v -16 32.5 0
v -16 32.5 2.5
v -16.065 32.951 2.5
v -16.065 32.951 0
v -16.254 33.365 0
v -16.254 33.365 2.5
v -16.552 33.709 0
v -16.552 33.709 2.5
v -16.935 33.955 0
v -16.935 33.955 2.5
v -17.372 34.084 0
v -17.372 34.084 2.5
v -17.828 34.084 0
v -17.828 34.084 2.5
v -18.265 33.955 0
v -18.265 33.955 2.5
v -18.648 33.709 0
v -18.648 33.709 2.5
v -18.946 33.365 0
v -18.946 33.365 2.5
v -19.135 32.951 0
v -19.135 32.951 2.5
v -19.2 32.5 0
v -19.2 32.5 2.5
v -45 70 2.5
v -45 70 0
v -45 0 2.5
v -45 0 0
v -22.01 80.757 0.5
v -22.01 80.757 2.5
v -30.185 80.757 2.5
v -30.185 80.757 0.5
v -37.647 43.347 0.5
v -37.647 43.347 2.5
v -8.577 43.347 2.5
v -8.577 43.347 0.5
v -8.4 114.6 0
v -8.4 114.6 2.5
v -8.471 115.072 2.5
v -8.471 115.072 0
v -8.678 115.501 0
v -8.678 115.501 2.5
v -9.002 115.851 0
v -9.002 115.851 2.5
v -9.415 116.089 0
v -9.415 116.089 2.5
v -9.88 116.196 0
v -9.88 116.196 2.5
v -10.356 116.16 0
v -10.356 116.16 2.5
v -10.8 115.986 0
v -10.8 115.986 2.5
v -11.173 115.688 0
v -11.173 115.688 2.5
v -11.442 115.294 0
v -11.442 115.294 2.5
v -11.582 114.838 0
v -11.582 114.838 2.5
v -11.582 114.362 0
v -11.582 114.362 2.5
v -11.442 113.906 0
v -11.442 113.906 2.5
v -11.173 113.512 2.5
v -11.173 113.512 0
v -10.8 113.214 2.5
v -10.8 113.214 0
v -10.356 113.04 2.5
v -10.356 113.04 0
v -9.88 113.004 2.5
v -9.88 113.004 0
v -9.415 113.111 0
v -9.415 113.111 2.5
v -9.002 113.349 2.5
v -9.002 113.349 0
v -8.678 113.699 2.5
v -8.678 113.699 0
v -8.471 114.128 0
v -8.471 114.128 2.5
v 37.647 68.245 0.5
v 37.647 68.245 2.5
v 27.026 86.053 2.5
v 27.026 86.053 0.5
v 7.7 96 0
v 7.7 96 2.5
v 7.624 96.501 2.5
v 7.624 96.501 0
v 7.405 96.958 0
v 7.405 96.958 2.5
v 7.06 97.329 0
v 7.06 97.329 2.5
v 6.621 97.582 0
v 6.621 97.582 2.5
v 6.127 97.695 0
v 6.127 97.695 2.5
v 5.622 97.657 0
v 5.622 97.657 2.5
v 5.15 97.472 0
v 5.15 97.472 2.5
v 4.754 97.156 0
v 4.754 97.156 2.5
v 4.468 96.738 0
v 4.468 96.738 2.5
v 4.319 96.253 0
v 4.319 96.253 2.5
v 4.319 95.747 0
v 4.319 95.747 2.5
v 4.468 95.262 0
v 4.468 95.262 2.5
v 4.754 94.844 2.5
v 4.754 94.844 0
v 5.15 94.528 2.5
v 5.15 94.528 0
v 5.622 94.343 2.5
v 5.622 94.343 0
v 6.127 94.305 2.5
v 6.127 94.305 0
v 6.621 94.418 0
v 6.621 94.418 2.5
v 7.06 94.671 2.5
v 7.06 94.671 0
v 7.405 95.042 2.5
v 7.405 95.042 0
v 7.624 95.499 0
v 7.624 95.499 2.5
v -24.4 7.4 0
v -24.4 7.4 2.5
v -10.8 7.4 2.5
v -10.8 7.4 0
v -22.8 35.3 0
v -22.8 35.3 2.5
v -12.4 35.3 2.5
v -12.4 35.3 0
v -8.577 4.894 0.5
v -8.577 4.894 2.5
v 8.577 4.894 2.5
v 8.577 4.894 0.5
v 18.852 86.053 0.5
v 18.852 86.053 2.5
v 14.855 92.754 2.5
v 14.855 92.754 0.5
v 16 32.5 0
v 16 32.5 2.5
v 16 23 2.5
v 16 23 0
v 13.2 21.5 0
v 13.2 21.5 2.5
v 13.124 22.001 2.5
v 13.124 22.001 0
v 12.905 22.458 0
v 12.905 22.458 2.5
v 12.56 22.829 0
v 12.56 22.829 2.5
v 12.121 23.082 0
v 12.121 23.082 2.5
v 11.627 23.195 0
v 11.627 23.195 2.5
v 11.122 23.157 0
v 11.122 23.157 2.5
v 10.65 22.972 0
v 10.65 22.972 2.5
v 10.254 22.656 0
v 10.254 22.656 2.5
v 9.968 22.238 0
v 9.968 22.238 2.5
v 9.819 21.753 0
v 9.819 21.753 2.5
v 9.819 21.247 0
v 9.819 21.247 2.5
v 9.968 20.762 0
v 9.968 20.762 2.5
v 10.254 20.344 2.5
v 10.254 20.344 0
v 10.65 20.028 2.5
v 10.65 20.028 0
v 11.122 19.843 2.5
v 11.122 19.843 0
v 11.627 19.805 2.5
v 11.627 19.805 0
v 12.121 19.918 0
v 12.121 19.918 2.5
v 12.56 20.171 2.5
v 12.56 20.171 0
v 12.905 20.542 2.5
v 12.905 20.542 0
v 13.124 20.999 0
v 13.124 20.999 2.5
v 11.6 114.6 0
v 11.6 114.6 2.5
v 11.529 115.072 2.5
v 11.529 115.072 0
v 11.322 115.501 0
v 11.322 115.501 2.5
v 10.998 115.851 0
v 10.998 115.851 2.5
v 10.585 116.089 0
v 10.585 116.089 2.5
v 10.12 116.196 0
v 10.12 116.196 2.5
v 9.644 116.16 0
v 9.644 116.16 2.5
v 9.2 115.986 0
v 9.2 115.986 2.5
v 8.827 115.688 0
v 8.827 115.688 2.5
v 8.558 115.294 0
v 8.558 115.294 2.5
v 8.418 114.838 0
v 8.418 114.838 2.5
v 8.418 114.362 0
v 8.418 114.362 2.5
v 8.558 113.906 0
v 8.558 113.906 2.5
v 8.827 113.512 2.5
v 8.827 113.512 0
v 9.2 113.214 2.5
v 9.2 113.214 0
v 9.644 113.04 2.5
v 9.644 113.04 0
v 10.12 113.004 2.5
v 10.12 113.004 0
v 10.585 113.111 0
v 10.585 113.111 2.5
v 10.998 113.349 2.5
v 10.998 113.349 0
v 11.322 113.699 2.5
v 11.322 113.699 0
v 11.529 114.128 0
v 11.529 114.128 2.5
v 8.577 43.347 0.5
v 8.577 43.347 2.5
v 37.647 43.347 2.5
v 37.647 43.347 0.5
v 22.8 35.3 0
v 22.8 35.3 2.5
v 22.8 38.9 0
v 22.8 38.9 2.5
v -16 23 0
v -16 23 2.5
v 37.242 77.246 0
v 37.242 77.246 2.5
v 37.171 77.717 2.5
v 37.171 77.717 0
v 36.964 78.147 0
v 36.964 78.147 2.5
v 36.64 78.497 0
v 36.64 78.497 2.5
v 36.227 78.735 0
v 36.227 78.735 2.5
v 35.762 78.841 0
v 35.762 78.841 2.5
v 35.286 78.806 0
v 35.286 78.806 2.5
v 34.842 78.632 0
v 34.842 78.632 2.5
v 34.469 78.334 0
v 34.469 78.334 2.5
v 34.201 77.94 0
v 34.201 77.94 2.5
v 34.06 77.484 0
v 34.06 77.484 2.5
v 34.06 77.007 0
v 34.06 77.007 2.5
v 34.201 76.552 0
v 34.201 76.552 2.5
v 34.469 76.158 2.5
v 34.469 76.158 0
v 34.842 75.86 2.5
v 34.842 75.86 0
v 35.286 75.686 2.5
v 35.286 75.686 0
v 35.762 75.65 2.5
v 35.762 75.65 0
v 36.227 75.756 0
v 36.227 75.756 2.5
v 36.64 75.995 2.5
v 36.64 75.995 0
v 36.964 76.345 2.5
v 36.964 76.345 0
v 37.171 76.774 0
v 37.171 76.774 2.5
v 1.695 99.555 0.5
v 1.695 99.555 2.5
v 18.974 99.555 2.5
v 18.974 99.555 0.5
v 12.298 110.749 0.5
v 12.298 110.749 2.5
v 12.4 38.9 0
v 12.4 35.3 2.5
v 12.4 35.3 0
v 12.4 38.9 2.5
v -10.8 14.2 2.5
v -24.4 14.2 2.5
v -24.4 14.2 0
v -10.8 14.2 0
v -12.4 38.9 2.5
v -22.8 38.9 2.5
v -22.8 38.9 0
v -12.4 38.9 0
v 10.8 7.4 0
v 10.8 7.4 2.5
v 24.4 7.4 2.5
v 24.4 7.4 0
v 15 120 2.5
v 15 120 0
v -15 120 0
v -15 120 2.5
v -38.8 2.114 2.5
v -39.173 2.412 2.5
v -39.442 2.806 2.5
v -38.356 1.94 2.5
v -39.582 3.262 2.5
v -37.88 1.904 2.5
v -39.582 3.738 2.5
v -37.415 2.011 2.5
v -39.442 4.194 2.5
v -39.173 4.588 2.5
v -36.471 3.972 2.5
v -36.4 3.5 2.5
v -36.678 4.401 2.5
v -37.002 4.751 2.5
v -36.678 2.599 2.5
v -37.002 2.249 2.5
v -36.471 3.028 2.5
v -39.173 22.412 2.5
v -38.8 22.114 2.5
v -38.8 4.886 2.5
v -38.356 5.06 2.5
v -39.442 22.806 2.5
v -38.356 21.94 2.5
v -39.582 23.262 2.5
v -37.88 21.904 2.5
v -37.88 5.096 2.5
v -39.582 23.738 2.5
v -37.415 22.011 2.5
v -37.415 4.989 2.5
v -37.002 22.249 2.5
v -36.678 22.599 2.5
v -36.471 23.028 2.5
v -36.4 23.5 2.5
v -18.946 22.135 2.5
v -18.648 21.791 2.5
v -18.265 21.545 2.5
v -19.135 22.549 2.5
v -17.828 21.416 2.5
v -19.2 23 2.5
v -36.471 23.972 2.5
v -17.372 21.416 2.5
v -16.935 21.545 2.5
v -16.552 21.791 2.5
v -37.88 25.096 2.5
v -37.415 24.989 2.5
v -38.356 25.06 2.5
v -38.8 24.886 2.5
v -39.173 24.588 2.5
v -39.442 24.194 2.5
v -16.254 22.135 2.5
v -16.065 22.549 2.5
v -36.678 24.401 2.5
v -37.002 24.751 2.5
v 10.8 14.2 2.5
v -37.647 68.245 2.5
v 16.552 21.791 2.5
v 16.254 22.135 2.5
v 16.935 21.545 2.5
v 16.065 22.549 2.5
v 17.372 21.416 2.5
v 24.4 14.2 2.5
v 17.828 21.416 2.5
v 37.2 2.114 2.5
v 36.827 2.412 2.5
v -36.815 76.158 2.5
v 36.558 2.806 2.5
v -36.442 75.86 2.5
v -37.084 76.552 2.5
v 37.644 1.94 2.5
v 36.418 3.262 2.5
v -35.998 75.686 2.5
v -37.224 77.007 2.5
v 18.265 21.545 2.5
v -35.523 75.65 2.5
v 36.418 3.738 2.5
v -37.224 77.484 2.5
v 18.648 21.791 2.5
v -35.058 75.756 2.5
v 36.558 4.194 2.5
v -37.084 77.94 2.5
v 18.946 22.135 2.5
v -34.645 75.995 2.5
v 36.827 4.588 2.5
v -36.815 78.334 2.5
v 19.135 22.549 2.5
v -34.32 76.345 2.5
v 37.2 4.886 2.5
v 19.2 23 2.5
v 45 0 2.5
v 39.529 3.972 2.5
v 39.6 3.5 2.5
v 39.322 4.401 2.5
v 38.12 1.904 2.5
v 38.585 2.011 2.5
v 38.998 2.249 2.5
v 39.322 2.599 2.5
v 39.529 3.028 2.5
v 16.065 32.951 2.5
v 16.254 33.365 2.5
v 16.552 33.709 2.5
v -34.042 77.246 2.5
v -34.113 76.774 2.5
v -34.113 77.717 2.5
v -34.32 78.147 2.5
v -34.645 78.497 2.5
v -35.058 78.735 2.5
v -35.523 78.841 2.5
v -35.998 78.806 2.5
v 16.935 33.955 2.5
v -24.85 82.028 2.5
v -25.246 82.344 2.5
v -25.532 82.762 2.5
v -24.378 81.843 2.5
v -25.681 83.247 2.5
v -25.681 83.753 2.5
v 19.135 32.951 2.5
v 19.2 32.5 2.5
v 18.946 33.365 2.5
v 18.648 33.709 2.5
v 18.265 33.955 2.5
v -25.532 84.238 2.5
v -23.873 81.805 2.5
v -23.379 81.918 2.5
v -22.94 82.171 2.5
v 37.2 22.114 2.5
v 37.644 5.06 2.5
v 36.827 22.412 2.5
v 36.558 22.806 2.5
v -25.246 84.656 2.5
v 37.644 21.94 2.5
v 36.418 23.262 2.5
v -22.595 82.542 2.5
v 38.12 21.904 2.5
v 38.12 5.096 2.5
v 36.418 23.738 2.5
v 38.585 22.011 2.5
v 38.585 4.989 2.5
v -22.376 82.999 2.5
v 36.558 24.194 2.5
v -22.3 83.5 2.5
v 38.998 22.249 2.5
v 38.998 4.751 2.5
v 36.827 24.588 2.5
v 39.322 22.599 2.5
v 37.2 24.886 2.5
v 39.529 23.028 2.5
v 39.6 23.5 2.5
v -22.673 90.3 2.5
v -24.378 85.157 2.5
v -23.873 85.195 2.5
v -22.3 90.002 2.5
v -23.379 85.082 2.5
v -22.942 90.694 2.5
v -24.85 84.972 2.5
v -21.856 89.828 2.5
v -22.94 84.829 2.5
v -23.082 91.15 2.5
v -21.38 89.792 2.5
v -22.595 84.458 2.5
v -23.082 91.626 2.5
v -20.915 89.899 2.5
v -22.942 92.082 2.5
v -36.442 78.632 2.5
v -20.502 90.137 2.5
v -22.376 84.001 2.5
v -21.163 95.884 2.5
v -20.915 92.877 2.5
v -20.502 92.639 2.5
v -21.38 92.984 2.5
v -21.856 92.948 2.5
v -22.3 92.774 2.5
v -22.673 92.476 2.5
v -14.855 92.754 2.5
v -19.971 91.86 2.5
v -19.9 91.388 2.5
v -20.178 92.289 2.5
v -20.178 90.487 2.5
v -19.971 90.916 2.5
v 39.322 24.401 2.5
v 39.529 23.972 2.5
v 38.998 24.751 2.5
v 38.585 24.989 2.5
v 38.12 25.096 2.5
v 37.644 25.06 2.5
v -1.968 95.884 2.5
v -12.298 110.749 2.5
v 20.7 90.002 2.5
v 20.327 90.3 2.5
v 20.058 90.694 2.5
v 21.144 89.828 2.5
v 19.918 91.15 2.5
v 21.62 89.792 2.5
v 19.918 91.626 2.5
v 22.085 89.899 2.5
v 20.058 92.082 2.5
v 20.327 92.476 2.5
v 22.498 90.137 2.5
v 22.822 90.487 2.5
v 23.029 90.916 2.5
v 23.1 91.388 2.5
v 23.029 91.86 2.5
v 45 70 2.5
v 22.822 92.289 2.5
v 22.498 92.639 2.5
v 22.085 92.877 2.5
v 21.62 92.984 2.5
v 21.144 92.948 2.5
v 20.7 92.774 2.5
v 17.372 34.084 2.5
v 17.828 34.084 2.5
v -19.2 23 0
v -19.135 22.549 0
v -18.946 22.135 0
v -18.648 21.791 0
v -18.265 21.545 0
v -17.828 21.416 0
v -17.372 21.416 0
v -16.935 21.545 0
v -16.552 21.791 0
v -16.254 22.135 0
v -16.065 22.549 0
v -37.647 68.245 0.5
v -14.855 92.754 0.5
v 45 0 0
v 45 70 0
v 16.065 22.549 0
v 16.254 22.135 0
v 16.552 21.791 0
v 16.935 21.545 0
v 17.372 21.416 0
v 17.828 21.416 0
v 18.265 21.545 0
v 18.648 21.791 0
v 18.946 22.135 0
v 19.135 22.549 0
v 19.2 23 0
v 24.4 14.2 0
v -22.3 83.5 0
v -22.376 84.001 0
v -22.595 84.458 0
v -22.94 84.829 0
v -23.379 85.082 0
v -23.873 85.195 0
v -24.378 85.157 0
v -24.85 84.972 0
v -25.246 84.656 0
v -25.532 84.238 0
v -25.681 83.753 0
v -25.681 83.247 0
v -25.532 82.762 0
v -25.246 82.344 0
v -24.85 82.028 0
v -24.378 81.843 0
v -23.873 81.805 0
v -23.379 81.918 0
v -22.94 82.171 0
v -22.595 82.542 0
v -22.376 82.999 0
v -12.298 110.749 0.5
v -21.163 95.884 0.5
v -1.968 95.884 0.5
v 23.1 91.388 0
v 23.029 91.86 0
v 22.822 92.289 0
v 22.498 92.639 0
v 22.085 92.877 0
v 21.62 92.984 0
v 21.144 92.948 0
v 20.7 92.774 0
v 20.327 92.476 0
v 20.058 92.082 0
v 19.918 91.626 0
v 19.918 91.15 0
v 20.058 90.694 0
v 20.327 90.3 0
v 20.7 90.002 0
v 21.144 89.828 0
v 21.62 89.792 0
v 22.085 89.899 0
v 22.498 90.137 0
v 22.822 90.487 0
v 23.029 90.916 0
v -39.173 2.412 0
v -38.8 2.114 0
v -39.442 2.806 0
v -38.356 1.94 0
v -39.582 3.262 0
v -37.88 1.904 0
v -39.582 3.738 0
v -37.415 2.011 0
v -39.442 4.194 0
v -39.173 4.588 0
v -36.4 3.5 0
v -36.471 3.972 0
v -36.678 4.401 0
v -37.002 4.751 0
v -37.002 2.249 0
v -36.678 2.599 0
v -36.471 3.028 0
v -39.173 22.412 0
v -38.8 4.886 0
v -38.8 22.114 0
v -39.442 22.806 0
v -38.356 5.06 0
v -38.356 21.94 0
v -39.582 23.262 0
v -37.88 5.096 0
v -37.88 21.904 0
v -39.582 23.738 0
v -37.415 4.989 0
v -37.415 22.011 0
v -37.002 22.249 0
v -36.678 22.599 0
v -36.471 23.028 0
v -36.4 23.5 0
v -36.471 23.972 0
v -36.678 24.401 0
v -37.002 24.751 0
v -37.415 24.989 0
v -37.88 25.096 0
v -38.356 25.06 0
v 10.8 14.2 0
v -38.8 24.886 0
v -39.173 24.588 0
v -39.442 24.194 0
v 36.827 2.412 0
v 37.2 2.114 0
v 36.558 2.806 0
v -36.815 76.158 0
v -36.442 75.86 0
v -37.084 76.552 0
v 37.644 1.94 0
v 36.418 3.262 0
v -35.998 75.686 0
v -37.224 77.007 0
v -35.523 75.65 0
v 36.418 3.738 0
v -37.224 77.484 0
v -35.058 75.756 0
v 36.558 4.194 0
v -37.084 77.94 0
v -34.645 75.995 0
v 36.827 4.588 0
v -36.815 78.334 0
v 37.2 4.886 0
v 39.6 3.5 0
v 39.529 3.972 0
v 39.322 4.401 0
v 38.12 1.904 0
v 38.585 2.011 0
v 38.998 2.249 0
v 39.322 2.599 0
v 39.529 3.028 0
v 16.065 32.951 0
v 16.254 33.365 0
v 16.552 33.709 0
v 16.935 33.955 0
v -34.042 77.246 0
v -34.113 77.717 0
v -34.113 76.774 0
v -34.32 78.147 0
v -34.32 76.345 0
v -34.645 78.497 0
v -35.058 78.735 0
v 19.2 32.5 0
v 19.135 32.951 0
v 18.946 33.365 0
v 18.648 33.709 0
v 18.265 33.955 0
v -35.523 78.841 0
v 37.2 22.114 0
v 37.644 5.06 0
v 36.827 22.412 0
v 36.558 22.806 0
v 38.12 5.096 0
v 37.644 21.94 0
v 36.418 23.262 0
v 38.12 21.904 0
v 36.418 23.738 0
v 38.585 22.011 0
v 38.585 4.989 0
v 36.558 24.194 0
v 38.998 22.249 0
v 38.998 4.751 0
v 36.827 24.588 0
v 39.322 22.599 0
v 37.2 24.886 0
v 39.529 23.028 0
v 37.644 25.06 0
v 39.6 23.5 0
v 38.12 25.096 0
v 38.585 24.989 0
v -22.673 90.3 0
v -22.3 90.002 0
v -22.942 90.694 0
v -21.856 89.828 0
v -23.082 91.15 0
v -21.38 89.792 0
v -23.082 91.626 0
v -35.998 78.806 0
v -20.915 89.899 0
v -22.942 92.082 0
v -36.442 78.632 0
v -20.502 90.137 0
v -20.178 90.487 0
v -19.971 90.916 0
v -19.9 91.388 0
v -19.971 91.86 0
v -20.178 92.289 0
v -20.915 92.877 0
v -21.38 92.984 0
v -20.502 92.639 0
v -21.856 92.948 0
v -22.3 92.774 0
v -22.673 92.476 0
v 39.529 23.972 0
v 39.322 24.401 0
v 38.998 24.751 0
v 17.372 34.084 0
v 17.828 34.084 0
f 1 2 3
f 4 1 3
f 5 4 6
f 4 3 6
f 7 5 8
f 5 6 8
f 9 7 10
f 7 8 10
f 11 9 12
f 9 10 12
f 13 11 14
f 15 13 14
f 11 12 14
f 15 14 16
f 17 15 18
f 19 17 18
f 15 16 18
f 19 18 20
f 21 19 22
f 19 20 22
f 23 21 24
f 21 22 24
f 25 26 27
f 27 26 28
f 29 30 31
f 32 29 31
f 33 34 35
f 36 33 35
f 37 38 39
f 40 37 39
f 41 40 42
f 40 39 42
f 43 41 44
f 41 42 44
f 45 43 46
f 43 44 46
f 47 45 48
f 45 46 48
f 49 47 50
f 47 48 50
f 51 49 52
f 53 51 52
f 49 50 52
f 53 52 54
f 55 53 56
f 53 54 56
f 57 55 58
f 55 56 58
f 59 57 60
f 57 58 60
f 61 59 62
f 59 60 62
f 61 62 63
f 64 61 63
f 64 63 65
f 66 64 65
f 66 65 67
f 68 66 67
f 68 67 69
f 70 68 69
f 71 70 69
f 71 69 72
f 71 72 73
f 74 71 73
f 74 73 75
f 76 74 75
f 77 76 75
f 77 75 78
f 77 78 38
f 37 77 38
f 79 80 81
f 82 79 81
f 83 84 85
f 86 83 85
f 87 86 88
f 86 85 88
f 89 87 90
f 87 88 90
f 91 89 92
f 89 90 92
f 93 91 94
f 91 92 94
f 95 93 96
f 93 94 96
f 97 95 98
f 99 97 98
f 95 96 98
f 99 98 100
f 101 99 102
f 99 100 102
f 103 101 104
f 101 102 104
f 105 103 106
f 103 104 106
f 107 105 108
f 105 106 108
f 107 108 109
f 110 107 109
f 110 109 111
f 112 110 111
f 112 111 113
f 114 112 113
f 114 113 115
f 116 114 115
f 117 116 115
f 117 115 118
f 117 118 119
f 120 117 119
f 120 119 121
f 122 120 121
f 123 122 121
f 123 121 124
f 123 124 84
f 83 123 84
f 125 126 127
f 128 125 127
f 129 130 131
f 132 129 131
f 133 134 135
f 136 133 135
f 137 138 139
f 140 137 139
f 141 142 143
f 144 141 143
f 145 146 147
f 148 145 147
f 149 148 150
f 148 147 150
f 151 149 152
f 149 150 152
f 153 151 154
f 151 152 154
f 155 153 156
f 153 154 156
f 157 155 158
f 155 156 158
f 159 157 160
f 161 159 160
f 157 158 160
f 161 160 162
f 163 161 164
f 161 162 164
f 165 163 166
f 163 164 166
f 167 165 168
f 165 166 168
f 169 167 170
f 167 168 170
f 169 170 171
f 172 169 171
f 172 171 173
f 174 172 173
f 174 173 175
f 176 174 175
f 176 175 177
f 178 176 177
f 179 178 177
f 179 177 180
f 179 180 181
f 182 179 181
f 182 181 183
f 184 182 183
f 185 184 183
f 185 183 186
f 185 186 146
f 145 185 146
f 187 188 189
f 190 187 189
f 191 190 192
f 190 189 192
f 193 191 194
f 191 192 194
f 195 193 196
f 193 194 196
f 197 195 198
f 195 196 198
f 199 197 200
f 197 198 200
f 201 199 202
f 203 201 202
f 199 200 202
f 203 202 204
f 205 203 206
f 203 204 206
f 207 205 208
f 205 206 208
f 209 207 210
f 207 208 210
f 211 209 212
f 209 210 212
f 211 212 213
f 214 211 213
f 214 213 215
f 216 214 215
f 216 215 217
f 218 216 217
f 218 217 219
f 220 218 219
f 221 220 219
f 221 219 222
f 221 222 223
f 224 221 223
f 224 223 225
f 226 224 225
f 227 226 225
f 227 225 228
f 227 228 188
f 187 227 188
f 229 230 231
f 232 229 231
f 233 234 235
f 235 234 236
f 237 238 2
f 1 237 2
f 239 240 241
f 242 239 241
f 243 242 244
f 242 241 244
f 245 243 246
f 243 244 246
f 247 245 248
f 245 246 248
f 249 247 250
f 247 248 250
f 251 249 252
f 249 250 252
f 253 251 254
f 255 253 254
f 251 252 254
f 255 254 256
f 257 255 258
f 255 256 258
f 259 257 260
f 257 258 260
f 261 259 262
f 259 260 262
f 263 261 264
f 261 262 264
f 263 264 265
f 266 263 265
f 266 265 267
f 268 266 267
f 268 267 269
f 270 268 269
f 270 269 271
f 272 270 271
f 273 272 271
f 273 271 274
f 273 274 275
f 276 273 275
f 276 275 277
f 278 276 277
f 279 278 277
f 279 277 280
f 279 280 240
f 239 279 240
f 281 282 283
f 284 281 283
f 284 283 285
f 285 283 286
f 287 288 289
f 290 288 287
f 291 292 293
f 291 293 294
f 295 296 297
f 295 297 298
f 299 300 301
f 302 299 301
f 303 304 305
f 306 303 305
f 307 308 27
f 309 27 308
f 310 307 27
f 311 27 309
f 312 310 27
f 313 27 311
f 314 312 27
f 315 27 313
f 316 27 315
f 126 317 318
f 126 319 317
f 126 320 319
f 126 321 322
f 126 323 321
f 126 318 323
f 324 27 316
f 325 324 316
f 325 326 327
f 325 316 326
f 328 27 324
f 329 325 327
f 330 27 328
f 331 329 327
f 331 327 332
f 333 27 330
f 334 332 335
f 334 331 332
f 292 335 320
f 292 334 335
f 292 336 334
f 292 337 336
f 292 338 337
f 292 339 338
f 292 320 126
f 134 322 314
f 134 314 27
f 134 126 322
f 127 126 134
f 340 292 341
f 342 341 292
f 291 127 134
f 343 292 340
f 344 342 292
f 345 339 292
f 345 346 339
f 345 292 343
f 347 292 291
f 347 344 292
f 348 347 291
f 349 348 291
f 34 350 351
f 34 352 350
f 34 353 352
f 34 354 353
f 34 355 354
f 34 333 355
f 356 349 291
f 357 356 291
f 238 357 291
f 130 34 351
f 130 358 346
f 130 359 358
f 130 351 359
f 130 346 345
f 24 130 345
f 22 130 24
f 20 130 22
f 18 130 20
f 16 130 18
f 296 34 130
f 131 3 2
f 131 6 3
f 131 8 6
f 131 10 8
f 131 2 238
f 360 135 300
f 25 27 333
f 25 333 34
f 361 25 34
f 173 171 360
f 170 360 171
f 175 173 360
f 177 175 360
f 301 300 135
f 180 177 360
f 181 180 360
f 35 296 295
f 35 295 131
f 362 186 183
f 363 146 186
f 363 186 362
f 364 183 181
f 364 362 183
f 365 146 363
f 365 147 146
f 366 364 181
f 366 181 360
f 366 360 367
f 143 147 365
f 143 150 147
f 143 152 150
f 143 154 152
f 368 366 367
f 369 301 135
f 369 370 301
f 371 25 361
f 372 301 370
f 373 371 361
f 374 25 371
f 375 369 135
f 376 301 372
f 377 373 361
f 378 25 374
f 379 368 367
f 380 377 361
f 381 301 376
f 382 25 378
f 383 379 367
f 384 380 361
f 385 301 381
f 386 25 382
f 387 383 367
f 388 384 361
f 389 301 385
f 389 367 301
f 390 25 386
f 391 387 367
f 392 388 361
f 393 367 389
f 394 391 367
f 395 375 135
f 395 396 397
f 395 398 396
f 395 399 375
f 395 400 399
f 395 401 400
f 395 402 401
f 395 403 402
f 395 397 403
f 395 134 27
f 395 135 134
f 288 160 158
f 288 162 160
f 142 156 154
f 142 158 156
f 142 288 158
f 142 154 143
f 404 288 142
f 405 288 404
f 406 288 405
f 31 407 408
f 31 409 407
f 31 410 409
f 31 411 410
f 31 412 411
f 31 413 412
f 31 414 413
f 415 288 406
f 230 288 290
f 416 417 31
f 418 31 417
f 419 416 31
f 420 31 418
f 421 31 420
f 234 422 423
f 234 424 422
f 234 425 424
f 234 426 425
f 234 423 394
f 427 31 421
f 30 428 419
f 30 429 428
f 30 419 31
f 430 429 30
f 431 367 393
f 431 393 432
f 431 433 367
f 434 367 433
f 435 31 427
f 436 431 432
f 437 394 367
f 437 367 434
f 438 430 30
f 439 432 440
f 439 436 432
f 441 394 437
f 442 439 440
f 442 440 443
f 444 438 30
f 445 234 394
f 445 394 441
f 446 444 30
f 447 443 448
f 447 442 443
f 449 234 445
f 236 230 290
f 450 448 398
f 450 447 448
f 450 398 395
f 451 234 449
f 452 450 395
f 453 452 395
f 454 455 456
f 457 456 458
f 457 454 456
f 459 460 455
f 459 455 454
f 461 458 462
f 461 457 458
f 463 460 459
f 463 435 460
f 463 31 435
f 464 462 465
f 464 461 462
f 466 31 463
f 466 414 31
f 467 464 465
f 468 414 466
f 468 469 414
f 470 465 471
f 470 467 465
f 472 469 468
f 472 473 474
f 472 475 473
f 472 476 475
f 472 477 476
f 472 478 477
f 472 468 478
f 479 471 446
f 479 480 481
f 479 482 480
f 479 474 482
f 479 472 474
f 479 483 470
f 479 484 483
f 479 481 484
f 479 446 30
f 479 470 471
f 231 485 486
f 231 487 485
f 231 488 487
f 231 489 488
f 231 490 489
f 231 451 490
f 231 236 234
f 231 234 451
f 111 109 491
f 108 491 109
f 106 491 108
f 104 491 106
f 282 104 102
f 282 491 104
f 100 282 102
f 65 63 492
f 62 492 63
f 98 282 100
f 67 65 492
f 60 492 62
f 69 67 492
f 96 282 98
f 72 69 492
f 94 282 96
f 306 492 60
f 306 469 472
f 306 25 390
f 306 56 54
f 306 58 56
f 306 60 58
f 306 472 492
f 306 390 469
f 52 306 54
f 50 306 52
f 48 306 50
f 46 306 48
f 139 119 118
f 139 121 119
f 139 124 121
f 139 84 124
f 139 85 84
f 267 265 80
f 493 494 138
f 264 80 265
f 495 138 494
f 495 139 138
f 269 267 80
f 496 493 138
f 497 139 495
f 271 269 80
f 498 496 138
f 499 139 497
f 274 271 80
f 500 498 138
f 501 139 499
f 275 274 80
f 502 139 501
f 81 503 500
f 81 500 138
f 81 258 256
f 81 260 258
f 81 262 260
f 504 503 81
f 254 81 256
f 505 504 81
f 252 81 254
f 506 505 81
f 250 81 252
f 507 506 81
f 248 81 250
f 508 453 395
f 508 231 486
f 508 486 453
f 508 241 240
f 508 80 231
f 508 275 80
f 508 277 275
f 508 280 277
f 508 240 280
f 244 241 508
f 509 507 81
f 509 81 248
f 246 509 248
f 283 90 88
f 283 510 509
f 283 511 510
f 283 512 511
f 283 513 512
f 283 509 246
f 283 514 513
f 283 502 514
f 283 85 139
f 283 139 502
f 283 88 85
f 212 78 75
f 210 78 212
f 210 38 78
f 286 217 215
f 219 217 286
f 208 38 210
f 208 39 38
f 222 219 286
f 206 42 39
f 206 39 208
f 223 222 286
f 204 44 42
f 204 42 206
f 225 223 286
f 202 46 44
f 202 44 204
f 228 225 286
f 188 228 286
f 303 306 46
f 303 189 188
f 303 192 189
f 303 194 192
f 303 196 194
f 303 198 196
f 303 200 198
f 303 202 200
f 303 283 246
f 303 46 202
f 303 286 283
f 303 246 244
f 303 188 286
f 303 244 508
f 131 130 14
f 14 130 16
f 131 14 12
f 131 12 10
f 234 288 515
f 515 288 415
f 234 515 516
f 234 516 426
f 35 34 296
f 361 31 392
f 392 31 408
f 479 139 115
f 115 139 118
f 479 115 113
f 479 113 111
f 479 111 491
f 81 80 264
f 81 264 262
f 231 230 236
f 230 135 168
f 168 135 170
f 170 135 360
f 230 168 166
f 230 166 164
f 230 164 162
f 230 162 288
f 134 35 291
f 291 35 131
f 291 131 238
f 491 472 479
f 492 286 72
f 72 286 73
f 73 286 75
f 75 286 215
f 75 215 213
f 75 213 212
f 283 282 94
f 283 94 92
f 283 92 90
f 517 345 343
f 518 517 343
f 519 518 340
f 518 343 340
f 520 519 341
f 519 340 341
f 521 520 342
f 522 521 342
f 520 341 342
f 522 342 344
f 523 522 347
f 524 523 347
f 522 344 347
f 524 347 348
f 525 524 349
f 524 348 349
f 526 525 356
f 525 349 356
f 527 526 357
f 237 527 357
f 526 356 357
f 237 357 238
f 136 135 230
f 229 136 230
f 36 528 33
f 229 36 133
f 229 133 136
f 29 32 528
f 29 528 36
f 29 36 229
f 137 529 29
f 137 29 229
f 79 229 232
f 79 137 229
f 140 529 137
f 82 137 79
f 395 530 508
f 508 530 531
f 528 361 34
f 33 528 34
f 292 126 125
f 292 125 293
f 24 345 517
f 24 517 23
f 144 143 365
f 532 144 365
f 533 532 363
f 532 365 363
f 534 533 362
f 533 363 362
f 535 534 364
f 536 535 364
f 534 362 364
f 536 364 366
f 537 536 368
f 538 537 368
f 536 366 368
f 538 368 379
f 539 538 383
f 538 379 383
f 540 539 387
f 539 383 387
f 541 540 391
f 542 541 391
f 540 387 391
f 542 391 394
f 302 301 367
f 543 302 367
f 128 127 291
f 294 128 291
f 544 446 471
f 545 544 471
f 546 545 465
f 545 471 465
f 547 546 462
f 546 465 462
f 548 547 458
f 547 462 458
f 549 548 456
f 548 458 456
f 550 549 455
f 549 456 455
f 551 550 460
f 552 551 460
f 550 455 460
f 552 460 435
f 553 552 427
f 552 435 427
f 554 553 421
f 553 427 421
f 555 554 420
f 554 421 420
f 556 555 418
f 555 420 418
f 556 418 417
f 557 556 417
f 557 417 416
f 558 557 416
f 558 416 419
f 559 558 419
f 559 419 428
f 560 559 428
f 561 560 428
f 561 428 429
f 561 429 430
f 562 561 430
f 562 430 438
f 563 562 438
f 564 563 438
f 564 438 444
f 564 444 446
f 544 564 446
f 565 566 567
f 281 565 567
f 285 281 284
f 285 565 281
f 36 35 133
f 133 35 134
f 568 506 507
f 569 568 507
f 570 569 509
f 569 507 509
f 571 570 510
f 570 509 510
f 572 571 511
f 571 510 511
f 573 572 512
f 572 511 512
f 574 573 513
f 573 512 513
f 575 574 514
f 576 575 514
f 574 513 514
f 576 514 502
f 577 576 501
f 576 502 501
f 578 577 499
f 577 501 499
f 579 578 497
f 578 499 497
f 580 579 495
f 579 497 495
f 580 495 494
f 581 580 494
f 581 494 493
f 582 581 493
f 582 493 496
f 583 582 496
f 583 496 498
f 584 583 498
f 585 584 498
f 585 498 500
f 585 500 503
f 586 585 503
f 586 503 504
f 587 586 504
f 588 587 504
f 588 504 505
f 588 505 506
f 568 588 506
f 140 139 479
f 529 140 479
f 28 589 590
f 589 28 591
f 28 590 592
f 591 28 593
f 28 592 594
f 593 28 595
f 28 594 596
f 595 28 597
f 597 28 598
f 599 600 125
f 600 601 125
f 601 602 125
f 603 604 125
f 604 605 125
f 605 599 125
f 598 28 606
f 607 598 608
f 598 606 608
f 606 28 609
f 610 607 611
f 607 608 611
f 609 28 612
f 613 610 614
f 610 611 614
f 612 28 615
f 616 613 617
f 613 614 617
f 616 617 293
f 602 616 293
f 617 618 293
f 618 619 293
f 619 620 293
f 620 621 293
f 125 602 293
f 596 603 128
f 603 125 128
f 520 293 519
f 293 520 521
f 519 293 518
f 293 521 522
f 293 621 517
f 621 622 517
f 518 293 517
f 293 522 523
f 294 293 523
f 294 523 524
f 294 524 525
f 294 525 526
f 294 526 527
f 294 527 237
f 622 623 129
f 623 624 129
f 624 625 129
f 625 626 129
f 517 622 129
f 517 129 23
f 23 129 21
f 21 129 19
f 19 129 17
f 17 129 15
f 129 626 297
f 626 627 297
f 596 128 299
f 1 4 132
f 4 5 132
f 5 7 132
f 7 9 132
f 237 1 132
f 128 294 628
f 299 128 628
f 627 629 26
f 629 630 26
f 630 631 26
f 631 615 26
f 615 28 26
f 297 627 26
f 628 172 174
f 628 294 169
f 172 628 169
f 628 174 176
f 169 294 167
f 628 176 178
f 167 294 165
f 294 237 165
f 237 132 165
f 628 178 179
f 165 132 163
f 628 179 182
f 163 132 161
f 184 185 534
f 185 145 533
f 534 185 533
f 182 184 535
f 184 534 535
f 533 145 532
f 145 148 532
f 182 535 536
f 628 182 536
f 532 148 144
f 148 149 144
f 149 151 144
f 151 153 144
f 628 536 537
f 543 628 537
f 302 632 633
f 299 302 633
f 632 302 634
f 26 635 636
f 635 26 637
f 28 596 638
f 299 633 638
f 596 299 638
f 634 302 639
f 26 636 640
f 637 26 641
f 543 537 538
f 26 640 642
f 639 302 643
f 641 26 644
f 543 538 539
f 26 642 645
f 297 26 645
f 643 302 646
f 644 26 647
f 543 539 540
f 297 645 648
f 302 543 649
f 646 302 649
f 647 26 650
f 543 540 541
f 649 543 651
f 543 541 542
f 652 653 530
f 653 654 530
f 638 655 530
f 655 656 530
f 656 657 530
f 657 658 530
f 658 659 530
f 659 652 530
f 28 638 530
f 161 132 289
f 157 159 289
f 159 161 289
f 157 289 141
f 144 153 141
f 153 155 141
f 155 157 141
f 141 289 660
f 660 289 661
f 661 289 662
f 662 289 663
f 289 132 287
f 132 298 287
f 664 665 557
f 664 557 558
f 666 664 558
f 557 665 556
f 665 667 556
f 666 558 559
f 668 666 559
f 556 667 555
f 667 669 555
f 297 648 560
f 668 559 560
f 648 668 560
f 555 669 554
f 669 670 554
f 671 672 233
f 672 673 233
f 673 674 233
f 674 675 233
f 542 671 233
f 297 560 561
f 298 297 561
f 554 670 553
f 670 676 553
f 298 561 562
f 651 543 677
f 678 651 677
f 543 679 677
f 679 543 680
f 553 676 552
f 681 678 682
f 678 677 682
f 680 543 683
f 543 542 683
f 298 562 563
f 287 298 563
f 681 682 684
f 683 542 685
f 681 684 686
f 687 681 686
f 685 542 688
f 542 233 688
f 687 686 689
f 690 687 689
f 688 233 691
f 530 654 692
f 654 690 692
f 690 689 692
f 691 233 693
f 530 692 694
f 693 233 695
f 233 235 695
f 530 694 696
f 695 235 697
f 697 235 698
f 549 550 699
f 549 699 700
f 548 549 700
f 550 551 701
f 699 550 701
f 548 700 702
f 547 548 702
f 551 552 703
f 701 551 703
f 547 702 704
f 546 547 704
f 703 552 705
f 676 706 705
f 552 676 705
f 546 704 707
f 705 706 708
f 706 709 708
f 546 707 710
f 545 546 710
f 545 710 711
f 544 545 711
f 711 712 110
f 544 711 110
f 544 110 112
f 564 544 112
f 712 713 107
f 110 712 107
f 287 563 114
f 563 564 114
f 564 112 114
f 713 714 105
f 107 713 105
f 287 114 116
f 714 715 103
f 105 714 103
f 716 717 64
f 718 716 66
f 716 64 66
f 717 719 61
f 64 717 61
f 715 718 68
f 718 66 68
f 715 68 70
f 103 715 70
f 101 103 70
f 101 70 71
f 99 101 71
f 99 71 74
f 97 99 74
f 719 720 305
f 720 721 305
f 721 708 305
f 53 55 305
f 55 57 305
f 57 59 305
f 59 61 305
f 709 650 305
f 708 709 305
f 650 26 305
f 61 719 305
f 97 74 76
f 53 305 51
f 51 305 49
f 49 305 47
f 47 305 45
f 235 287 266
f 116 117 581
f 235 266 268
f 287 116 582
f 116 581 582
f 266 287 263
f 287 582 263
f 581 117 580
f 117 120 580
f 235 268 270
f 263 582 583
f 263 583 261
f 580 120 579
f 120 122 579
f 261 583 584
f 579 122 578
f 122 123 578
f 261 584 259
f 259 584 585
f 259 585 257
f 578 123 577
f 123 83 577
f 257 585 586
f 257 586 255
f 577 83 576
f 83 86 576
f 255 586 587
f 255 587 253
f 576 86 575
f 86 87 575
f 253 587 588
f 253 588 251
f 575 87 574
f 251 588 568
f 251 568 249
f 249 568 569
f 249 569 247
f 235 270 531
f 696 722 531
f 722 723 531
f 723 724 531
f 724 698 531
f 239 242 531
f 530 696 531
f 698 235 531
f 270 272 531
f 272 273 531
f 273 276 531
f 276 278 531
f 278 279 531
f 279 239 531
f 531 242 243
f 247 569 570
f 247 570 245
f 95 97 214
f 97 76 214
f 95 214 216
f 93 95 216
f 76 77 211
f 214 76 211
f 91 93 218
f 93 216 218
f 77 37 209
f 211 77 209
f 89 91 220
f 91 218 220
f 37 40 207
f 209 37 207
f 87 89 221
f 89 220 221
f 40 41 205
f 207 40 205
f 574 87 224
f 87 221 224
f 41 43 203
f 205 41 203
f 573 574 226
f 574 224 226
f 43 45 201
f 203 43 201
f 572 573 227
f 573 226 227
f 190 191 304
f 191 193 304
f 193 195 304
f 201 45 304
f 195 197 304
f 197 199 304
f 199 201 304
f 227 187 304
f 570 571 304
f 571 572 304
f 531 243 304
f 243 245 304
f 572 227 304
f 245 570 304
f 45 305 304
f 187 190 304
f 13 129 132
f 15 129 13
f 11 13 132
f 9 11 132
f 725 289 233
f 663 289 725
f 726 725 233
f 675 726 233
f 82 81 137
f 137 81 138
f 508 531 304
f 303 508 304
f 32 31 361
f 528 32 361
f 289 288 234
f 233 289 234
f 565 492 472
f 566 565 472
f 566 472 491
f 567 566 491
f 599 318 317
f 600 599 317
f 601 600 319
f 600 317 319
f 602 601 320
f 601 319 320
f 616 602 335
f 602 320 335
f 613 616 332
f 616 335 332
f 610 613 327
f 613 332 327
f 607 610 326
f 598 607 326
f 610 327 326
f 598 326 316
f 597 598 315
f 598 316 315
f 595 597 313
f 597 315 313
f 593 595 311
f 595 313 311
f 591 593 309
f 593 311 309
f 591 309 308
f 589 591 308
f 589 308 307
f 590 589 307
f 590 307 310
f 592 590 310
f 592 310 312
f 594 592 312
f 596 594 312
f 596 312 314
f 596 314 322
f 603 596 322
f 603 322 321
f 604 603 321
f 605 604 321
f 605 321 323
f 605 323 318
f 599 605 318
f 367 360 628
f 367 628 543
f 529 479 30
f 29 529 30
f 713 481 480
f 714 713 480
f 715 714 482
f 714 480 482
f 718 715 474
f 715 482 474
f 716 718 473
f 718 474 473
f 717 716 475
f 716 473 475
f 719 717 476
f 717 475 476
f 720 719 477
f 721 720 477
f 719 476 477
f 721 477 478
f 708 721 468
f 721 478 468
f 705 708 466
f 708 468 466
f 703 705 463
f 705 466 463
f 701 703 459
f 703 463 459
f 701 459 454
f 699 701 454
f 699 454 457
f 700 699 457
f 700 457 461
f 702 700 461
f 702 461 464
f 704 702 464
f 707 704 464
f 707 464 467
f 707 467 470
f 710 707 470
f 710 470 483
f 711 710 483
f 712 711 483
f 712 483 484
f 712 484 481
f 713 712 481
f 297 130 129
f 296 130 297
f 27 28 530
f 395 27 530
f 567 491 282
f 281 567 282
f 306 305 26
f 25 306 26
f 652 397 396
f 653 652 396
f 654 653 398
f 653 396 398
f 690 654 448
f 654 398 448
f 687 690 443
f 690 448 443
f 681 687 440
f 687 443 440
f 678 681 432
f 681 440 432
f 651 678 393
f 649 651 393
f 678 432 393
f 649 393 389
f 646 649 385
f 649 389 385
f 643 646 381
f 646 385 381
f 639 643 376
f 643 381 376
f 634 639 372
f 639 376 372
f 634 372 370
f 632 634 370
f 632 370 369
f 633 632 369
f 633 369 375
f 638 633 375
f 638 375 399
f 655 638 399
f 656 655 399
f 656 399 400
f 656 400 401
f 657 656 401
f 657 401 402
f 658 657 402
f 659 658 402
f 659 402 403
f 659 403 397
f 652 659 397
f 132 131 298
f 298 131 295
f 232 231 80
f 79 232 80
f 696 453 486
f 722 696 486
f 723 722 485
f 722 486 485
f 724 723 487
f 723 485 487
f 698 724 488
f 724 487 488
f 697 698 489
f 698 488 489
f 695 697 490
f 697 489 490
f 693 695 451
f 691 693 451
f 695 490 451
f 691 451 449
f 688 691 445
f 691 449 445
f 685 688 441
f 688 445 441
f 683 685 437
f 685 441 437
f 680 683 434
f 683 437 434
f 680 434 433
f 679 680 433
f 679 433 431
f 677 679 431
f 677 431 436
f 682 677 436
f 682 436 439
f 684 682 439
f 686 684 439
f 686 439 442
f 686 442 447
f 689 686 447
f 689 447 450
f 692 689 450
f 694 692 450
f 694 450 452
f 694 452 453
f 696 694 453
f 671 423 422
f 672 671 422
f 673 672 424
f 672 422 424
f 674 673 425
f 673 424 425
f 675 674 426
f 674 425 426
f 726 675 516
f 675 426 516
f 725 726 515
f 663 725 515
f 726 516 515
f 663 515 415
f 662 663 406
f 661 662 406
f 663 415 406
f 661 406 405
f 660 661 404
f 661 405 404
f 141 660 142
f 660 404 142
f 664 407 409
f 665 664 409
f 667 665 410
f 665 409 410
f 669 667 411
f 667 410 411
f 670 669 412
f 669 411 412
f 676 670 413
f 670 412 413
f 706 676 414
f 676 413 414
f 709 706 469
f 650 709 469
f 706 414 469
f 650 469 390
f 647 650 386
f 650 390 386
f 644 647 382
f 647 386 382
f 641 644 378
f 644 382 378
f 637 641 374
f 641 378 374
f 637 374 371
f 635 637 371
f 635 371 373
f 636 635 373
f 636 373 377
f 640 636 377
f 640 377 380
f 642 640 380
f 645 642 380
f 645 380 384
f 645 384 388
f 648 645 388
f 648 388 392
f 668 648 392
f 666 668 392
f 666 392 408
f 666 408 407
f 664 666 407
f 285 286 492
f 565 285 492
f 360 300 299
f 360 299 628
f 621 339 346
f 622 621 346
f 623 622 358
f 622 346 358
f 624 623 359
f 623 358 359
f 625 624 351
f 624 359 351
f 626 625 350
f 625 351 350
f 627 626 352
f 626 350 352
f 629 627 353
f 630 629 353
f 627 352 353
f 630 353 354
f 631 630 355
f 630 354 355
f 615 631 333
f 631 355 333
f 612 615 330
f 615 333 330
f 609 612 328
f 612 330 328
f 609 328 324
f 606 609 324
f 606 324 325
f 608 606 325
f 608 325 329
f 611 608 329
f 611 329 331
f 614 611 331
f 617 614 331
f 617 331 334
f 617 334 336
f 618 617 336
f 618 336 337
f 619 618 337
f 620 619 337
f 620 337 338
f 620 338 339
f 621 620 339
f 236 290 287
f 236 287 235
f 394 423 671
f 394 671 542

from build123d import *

# Parameters (mm, degrees)
PAD_DEPTH       = 2.5
SKETCH001_R     = 1.6
SKETCH001_W     = 13.6
SKETCH001_H     = 6.8
SKETCH001_W_2   = 10.4
SKETCH001_H_2   = 3.6
POCKET_DEPTH    = 5
SKETCH002_R     = 1.7
POCKET001_DEPTH = 5
SKETCH004_R     = 1.6
POCKET002_DEPTH = 5
POCKET003_DEPTH = 2


with BuildPart() as part:
    # Sketch → Pad (new body)
    with BuildSketch(Plane.XY):
        Polygon((-45, 0), (45, 0), (45, 70), (15, 120), (-15, 120), (-45, 70), align=None)
    extrude(amount=PAD_DEPTH)

    # Sketch001 (on Face8 of Pad) → Pocket (cut)
    with BuildSketch(Plane.XY.offset(2.5)):
        with Locations((38, 3.5)):
            Circle(SKETCH001_R)
        with Locations((38, 23.5)):
            Circle(SKETCH001_R)
        with Locations((-38, 3.5)):
            Circle(SKETCH001_R)
        with Locations((-38, 23.5)):
            Circle(SKETCH001_R)
        with BuildLine():
            ThreePointArc((-19.2, 23), (-17.6, 21.4), (-16, 23))
            Line((-16, 23), (-16, 32.5))
            ThreePointArc((-16, 32.5), (-17.6, 34.1), (-19.2, 32.5))
            Line((-19.2, 23), (-19.2, 32.5))
        make_face()
        with BuildLine():
            ThreePointArc((19.2, 32.5), (17.6, 34.1), (16, 32.5))
            Line((16, 32.5), (16, 23))
            ThreePointArc((16, 23), (17.6, 21.4), (19.2, 23))
            Line((19.2, 32.5), (19.2, 23))
        make_face()
        with Locations((-17.6, 10.8)):
            Rectangle(SKETCH001_W, SKETCH001_H)
        with Locations((17.6, 10.8)):
            Rectangle(SKETCH001_W, SKETCH001_H)
        with Locations((17.6, 37.1)):
            Rectangle(SKETCH001_W_2, SKETCH001_H_2)
        with Locations((-17.6, 37.1)):
            Rectangle(SKETCH001_W_2, SKETCH001_H_2)
    extrude(amount=-POCKET_DEPTH, mode=Mode.SUBTRACT)

    # Sketch002 (on Face5 of Pocket) → Pocket001 (cut)
    with BuildSketch(Plane.XY.offset(2.5)):
        with Locations((6, 96)):
            Circle(SKETCH002_R)
        with Locations((-24, 83.5)):
            Circle(SKETCH002_R)
        with Locations((11.5, 21.5)):
            Circle(SKETCH002_R)
    extrude(amount=-POCKET001_DEPTH, mode=Mode.SUBTRACT)

    # Sketch004 (on Face5 of Pocket001) → Pocket002 (cut)
    with BuildSketch(Plane.XY.offset(2.5)):
        with Locations((10, 114.6)):
            Circle(SKETCH004_R)
        with Locations((-10, 114.6)):
            Circle(SKETCH004_R)
        with Locations((21.5, 91.3880009298)):
            Circle(SKETCH004_R)
        with Locations((35.6421356237, 77.2458653061)):
            Circle(SKETCH004_R)
        with Locations((-21.5, 91.3880009298)):
            Circle(SKETCH004_R)
        with Locations((-35.6421356237, 77.2458653061)):
            Circle(SKETCH004_R)
    extrude(amount=-POCKET002_DEPTH, mode=Mode.SUBTRACT)

    # Sketch003 (on Face5 of Pocket002) → Pocket003 (cut)
    with BuildSketch(Plane.XY.offset(2.5)):
        Polygon((-37.6466903558, 43.3474069665), (-8.5768340117, 43.3474069665), (-8.5768340117, 4.893821), (8.5768340117, 4.893821), (8.5768340117, 43.3474069665), (37.6466903558, 43.3474069665), (37.6466903558, 68.2449686275), (27.0264066989, 86.0525109264), (18.8520822966, 86.0525109264), (14.8551351559, 92.7543851488), (-14.8551351559, 92.7543851488), (-22.0103766194, 80.7568463697), (-30.1847010216, 80.7568463697), (-37.6466903558, 68.2449686275), align=None)
        Polygon((-21.162924581, 95.8840944515), (-1.9676886795, 95.8840944515), (1.694907, 99.5545331507), (18.973902678, 99.5545331507), (12.2977542374, 110.7487535303), (-12.2977542374, 110.7487535303), align=None)
    extrude(amount=-POCKET003_DEPTH, mode=Mode.SUBTRACT)


solid = part.part
